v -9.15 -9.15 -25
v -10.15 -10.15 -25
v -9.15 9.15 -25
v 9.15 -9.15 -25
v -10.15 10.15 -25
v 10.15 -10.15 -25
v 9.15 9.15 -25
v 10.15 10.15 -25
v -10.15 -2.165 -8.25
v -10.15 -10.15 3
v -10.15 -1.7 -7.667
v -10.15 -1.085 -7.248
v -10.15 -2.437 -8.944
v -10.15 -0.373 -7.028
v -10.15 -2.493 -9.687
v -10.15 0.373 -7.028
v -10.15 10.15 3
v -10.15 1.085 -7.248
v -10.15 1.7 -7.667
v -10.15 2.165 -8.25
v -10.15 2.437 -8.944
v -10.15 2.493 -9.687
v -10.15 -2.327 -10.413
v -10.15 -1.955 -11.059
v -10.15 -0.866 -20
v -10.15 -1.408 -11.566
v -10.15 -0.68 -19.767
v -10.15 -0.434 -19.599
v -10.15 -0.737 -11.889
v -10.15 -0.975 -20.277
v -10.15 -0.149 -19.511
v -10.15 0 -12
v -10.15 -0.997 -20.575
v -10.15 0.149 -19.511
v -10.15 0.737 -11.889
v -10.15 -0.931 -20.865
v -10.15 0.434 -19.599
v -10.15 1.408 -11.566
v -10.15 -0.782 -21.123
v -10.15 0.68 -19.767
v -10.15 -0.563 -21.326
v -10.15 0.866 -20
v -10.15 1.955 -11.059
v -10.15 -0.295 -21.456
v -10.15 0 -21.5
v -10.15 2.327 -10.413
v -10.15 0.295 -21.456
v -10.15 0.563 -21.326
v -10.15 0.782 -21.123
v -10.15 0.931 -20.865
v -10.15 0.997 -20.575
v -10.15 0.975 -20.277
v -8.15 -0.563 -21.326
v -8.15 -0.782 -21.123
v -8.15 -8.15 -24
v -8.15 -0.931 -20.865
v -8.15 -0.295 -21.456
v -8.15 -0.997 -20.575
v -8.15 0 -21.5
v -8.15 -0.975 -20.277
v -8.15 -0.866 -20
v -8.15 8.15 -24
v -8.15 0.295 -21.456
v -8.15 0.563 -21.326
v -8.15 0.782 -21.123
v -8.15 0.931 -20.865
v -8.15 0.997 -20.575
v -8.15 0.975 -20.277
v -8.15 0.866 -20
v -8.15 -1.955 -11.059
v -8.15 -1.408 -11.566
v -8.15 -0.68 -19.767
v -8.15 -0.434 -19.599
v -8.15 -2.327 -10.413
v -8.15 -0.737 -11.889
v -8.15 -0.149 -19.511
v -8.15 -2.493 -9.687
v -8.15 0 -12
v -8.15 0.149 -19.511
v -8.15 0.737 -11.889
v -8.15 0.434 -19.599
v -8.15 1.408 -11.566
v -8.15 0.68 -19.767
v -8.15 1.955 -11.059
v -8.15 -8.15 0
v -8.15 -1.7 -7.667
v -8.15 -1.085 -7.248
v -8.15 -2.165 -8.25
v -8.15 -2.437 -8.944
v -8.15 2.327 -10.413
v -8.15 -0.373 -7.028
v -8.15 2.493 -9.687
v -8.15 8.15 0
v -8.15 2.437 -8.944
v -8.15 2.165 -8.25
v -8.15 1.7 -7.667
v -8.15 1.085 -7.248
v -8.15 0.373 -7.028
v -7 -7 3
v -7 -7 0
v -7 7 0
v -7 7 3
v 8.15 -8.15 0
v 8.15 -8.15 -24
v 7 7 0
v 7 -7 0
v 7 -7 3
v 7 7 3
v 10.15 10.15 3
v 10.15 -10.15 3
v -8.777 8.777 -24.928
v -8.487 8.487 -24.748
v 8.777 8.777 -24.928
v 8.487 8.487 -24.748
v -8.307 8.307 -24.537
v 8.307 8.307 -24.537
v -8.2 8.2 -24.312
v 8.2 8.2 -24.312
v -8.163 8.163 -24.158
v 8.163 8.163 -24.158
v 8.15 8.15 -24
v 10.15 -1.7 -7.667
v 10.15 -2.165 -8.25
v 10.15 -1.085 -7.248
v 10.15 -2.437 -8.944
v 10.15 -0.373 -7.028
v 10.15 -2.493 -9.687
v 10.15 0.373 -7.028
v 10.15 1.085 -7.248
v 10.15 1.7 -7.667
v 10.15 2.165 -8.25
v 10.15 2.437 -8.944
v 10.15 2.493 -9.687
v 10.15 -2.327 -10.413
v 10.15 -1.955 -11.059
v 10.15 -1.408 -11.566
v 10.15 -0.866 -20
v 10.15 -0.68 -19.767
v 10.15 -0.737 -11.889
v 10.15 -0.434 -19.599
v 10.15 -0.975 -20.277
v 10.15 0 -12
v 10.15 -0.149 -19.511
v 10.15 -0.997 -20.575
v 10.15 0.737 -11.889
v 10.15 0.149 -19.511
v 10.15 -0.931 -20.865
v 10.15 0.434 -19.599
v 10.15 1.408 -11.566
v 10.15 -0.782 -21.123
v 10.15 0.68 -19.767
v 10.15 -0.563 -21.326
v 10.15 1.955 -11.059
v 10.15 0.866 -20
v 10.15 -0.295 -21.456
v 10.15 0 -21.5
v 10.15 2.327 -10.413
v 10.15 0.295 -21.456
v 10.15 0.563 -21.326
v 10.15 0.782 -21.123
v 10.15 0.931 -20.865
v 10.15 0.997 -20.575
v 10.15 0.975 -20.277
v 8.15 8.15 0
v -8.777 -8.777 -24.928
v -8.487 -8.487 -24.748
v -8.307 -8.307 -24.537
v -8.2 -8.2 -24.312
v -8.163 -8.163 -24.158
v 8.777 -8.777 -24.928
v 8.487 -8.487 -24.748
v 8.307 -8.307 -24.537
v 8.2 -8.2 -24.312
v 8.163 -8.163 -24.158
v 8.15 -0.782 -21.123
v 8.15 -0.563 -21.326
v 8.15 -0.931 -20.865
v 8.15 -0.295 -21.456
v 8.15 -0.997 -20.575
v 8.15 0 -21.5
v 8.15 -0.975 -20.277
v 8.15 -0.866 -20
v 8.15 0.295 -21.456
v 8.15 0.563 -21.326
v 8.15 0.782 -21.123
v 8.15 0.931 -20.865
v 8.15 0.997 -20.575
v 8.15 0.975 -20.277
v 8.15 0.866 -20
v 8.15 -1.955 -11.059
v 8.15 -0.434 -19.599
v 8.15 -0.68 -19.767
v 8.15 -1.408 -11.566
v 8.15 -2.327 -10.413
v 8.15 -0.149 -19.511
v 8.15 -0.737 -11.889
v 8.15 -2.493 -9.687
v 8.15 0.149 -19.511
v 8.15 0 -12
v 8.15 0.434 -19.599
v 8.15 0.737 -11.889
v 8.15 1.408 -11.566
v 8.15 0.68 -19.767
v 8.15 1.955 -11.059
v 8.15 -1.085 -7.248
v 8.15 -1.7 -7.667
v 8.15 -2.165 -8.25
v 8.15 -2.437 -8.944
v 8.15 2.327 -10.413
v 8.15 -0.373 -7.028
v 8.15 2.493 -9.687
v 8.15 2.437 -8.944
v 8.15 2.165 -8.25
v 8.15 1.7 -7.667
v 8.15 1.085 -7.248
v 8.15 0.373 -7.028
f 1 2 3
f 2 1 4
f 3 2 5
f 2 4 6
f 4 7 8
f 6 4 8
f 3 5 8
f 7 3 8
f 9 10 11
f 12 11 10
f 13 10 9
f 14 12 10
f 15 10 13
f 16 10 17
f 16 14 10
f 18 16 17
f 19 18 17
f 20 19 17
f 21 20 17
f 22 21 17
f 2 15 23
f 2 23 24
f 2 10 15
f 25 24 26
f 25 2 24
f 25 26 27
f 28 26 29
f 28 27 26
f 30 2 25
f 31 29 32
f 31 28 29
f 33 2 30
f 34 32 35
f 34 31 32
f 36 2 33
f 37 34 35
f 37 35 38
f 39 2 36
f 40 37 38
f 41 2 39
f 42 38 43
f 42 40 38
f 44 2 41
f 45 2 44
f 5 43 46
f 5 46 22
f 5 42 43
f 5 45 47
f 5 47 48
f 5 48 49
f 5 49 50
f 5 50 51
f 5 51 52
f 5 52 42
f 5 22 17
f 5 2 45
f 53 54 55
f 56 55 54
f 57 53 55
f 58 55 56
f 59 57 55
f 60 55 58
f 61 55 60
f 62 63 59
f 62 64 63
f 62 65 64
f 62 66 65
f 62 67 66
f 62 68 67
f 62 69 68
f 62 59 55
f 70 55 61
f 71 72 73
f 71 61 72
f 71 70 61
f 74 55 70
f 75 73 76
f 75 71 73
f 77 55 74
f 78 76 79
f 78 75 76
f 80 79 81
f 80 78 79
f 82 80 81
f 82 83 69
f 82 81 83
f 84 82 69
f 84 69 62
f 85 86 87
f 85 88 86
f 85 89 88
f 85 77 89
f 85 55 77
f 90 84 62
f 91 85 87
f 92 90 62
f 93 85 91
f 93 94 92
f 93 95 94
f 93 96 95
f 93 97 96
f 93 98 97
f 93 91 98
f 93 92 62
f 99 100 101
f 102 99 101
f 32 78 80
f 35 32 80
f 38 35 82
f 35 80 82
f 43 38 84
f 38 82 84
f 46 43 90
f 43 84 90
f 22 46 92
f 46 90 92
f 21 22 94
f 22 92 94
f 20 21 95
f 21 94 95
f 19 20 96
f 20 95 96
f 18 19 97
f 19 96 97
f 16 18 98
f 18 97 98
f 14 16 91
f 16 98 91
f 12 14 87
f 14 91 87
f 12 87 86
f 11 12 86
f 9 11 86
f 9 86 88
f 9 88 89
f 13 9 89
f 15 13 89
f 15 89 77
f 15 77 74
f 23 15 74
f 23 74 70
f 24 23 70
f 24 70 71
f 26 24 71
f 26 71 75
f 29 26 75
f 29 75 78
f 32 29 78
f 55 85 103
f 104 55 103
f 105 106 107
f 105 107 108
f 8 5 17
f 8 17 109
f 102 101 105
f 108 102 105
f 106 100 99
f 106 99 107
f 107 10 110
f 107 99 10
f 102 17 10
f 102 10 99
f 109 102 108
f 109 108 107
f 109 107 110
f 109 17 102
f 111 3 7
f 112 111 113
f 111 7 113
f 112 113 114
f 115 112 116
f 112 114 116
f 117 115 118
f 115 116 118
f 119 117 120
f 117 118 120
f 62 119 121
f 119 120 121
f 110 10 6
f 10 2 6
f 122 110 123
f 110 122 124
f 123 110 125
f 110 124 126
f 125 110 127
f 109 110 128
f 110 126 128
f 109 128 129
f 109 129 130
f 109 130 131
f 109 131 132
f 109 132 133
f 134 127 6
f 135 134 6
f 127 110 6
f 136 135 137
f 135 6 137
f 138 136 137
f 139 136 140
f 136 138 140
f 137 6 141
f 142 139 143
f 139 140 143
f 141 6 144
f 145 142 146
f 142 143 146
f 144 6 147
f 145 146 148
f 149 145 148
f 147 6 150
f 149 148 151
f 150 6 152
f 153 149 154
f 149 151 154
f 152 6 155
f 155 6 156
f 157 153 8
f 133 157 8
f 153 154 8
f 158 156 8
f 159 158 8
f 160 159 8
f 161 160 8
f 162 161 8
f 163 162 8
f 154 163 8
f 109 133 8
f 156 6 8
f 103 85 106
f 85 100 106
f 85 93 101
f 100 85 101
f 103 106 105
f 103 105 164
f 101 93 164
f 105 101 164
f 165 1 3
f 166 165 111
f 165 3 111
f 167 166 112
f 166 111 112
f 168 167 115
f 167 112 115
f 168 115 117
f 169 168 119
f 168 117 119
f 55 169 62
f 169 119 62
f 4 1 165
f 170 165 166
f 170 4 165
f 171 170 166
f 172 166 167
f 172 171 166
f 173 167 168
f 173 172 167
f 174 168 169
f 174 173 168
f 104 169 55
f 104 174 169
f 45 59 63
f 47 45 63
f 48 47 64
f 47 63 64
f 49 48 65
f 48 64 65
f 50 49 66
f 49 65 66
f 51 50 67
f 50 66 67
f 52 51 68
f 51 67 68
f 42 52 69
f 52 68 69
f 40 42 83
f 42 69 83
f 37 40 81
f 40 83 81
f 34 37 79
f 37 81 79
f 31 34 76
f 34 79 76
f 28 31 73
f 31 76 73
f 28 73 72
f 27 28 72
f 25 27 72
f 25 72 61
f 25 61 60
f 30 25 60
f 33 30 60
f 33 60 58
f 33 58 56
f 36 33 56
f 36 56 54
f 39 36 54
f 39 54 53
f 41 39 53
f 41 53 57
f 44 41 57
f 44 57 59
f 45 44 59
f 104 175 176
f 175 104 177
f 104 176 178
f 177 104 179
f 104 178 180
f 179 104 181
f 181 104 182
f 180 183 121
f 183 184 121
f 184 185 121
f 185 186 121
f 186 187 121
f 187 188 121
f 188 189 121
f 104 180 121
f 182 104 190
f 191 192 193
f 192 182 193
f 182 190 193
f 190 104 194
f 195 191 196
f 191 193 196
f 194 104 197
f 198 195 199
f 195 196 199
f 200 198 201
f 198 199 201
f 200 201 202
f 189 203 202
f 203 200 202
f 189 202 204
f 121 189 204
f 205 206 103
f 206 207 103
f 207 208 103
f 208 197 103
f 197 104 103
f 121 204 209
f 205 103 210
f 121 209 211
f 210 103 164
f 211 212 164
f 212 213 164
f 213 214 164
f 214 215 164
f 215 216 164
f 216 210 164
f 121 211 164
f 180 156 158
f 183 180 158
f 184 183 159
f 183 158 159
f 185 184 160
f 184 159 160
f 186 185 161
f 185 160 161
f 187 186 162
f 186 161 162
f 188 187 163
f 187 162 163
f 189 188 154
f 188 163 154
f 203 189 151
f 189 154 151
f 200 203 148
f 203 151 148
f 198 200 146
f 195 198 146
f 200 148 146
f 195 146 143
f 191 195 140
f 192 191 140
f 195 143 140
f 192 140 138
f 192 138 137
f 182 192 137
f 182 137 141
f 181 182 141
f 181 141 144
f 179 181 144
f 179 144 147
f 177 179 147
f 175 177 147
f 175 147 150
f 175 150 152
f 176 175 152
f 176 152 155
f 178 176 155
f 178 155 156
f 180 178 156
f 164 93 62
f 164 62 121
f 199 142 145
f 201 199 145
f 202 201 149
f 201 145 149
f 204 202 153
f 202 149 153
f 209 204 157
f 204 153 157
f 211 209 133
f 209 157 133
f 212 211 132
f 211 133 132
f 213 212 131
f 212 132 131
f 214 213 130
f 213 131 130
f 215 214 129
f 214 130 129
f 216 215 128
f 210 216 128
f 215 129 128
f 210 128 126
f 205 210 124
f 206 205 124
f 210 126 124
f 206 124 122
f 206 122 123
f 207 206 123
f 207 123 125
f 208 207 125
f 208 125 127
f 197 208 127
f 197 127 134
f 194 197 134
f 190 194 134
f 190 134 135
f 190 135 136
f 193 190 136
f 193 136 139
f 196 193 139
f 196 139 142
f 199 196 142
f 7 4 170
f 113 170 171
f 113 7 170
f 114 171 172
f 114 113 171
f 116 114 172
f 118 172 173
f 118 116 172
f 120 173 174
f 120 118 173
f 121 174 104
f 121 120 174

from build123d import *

# Parameters (mm, degrees)
SKETCH1_W           = 20.3
SKETCH1_H           = 20.3
SKETCH1_W_2         = 16.3
SKETCH1_H_2         = 16.3
BOSS_EXTRUDE1_DEPTH = 25
SKETCH2_W           = 20.3
SKETCH2_H           = 20.3
SKETCH2_W_2         = 14
SKETCH2_H_2         = 14
BOSS_EXTRUDE2_DEPTH = 3
SKETCH3_R           = 1
SKETCH3_R_2         = 2.5
CUT_EXTRUDE1_DEPTH  = 34.765551972
FILLET1_R           = 1


with BuildPart() as part:
    # Sketch1 → Boss-Extrude1 (new body)
    with BuildSketch(Plane.XY):
        Rectangle(SKETCH1_W, SKETCH1_H)
        Rectangle(SKETCH1_W_2, SKETCH1_H_2, mode=Mode.SUBTRACT)
    extrude(amount=-BOSS_EXTRUDE1_DEPTH)

    # Sketch2 → Boss-Extrude2 (add)
    with BuildSketch(Plane.XY):
        Rectangle(SKETCH2_W, SKETCH2_H)
        Rectangle(SKETCH2_W_2, SKETCH2_H_2, mode=Mode.SUBTRACT)
    extrude(amount=BOSS_EXTRUDE2_DEPTH)

    # Sketch3 → Cut-Extrude1 (cut, through all)
    with BuildSketch(Plane(origin=(10.15, 0, 0), x_dir=(0, 0, -1), z_dir=(1, 0, 0))):
        with Locations((20.5, 0)):
            Circle(SKETCH3_R)
        with Locations((9.5, 0)):
            Circle(SKETCH3_R_2)
    extrude(amount=-CUT_EXTRUDE1_DEPTH, mode=Mode.SUBTRACT)

    # Fillet1
    fillet1_edges = [part.edges().sort_by_distance(p)[0] for p in [
        (8.15, 0, -25),
        (0, -8.15, -25),
        (-8.15, 0, -25),
        (0, 8.15, -25),
    ]]
    fillet(fillet1_edges, radius=FILLET1_R)


solid = part.part
